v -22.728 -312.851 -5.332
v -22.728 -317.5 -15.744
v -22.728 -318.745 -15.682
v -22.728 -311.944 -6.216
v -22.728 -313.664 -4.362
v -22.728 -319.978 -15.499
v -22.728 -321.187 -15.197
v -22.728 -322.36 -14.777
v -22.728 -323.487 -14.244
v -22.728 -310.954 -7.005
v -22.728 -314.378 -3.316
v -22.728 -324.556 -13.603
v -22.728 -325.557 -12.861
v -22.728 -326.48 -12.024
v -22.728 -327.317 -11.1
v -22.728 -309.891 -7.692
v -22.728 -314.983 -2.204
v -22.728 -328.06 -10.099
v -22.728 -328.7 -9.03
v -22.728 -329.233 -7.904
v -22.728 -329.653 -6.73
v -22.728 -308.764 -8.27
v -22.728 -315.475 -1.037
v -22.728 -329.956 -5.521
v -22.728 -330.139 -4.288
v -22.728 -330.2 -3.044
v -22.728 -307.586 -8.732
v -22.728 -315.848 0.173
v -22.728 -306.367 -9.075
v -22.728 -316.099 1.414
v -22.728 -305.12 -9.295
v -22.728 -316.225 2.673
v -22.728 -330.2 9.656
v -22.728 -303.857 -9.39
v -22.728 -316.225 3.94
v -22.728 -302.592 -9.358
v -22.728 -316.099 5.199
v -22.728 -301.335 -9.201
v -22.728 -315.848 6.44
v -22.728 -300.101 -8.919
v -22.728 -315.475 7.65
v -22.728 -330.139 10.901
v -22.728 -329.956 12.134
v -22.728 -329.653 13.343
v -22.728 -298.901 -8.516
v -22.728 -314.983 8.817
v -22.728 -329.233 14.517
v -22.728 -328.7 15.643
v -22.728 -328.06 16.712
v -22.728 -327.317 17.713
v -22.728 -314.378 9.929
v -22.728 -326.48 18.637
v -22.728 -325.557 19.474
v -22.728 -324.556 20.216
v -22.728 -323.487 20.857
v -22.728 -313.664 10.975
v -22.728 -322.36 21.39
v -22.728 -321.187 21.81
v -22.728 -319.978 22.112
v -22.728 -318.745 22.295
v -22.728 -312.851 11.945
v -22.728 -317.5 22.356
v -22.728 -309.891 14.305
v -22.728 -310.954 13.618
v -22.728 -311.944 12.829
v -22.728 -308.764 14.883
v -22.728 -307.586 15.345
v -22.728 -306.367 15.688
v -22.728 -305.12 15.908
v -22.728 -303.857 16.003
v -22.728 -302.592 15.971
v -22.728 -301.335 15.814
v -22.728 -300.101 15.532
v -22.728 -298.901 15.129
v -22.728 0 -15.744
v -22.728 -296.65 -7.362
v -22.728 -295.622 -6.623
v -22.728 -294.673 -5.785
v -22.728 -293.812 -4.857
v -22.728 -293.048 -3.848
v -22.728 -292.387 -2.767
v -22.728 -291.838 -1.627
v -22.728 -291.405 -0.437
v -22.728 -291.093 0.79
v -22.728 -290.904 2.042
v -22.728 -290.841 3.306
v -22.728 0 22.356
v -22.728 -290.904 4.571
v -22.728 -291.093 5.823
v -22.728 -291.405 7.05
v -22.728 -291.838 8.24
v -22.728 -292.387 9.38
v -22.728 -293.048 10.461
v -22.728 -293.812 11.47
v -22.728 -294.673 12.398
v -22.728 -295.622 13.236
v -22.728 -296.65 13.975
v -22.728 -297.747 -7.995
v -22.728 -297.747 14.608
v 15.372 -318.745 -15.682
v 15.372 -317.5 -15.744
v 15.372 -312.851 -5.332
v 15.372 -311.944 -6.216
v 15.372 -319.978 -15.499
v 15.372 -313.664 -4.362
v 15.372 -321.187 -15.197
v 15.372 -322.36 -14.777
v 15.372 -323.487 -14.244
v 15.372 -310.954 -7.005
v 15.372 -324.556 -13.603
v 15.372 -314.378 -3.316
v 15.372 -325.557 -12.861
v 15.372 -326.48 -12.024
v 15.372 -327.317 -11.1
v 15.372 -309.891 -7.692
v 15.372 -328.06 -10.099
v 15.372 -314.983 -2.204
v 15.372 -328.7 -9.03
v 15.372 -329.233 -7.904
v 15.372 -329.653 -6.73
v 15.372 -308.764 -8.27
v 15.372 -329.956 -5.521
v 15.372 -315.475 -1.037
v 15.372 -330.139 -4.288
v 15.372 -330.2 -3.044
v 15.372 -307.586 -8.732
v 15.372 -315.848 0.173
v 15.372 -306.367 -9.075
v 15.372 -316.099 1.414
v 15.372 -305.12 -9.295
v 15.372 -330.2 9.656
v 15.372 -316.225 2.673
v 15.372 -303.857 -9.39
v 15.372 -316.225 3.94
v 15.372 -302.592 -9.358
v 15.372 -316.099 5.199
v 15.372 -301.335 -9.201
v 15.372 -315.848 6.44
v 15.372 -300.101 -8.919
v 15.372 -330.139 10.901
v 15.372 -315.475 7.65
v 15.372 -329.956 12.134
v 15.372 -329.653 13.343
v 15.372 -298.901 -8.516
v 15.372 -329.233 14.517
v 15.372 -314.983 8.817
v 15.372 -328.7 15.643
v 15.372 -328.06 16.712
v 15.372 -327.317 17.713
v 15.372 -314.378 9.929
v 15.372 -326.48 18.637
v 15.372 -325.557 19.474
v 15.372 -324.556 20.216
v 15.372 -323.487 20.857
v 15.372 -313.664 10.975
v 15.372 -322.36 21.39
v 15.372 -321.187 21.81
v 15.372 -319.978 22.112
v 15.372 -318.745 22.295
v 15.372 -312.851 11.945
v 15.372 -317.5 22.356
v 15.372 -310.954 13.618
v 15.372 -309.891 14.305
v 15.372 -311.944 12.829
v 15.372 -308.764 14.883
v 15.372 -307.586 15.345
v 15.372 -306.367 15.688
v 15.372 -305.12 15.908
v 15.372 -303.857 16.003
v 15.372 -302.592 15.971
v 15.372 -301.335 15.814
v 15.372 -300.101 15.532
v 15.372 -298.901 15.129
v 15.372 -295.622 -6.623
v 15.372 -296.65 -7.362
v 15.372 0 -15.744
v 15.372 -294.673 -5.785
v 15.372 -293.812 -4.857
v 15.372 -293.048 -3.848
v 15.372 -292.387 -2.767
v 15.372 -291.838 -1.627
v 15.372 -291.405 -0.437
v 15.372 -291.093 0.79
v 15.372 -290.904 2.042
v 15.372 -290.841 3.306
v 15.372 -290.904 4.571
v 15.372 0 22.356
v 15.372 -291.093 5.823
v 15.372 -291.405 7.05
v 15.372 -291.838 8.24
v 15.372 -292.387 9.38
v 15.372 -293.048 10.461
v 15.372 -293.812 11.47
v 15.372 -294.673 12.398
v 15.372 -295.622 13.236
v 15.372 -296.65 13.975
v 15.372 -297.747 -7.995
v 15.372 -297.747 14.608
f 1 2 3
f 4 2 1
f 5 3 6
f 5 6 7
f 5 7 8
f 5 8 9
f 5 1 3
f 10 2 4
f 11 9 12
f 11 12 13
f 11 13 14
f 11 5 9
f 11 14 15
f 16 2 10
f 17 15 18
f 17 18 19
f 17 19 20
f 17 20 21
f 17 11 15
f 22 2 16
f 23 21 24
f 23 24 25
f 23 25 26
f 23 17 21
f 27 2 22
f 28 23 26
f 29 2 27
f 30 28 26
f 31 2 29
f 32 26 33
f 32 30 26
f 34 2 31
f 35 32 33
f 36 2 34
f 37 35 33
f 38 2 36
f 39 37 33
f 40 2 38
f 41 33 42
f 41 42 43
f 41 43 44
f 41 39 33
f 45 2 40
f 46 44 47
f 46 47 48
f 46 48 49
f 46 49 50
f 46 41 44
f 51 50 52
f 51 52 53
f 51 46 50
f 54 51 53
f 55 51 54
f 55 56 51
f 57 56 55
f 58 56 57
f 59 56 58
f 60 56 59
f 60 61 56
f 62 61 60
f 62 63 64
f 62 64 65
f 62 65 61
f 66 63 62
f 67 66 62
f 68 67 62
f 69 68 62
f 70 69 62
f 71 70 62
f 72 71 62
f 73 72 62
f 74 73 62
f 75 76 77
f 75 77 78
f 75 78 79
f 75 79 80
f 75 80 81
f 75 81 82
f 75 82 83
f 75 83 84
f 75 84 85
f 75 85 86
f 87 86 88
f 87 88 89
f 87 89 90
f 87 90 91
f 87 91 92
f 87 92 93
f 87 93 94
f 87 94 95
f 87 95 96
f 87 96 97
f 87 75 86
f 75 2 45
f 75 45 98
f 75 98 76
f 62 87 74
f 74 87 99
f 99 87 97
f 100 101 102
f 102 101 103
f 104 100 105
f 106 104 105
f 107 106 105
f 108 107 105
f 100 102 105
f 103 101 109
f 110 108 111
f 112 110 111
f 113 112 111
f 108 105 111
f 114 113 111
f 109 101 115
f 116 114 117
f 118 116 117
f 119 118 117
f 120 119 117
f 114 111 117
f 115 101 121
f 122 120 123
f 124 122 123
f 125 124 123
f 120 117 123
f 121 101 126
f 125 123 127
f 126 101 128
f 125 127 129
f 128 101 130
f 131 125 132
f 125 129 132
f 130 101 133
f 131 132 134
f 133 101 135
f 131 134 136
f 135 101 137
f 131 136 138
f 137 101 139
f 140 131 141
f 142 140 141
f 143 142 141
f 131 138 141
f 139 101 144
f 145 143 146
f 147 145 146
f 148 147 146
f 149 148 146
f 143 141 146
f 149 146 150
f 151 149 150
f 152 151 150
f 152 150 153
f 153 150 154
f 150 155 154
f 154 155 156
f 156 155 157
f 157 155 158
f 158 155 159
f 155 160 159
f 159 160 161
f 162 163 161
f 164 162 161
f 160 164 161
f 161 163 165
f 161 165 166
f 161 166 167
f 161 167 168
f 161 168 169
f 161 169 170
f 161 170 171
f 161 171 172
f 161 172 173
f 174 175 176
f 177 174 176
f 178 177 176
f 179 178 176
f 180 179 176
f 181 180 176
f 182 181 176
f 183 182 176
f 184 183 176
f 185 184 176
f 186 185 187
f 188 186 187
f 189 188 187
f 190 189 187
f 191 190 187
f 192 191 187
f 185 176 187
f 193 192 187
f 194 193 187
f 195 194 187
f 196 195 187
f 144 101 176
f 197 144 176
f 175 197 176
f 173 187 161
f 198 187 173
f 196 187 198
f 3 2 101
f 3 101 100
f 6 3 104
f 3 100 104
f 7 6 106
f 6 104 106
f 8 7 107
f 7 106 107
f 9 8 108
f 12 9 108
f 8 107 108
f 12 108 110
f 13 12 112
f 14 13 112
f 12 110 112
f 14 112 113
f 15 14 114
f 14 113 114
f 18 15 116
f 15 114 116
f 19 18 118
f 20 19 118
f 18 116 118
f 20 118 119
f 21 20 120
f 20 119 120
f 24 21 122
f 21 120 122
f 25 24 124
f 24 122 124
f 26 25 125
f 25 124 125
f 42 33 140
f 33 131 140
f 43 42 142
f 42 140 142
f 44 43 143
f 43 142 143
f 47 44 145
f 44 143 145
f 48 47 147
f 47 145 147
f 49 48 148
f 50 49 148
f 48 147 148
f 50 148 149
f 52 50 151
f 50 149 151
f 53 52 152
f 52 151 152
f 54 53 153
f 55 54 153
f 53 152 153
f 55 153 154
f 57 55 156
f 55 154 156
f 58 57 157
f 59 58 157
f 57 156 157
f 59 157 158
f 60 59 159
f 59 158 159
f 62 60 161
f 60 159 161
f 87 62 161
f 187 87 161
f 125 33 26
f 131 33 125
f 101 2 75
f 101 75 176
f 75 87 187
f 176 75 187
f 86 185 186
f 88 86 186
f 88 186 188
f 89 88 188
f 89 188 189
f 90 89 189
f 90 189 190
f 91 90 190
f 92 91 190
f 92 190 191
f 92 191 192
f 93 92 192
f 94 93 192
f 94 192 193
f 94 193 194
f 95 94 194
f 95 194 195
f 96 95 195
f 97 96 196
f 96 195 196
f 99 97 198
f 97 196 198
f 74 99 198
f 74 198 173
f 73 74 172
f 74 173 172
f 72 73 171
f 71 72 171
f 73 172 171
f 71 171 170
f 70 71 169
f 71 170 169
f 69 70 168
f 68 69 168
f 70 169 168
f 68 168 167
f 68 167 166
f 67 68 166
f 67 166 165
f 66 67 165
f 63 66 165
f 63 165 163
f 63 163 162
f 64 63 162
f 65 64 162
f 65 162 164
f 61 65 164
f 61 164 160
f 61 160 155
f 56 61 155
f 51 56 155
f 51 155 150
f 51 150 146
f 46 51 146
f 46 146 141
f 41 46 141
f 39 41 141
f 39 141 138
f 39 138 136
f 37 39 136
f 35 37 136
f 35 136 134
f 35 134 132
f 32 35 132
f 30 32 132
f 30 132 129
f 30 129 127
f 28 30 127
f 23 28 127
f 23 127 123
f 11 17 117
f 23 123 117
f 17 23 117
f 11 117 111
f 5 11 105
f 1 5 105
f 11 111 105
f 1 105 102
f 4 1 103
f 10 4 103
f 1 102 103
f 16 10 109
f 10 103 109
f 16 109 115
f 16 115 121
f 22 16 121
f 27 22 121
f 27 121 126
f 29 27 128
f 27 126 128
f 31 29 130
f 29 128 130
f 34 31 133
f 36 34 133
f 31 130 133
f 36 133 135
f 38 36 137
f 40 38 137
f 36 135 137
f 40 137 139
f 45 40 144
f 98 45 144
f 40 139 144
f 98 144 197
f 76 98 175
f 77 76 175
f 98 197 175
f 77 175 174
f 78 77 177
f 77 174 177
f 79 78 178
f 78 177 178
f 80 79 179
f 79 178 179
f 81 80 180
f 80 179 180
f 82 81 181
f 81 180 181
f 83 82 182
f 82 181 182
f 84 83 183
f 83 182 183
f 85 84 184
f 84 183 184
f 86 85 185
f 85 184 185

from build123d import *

# Parameters (mm, degrees)
F0_W     = 38.1
F0_H     = 38.1
F1_DEPTH = 330.2
F2_R     = 12.7
F3_DEPTH = 38.101
F4_R     = 12.7


with BuildPart() as f1:
    # F0 (on Front) → F1 (new body)
    with BuildSketch(Plane.XZ):
        with Locations((-3.677602, 3.30648)):
            Rectangle(F0_W, F0_H)
    extrude(amount=F1_DEPTH)

    # F2 (on face) → F3 (cut, through all)
    with BuildSketch(Plane.YZ.offset(15.372398)):
        with Locations((-303.540766, 3.30648)):
            Circle(F2_R)
    extrude(amount=-F3_DEPTH, mode=Mode.SUBTRACT)

    # F4
    f4_edges = [f1.edges().sort_by_distance(p)[0] for p in [
        (-3.677602, -330.2, 22.35648),
        (-3.677602, -330.2, -15.74352),
    ]]
    fillet(f4_edges, radius=F4_R)


solid = f1.part
